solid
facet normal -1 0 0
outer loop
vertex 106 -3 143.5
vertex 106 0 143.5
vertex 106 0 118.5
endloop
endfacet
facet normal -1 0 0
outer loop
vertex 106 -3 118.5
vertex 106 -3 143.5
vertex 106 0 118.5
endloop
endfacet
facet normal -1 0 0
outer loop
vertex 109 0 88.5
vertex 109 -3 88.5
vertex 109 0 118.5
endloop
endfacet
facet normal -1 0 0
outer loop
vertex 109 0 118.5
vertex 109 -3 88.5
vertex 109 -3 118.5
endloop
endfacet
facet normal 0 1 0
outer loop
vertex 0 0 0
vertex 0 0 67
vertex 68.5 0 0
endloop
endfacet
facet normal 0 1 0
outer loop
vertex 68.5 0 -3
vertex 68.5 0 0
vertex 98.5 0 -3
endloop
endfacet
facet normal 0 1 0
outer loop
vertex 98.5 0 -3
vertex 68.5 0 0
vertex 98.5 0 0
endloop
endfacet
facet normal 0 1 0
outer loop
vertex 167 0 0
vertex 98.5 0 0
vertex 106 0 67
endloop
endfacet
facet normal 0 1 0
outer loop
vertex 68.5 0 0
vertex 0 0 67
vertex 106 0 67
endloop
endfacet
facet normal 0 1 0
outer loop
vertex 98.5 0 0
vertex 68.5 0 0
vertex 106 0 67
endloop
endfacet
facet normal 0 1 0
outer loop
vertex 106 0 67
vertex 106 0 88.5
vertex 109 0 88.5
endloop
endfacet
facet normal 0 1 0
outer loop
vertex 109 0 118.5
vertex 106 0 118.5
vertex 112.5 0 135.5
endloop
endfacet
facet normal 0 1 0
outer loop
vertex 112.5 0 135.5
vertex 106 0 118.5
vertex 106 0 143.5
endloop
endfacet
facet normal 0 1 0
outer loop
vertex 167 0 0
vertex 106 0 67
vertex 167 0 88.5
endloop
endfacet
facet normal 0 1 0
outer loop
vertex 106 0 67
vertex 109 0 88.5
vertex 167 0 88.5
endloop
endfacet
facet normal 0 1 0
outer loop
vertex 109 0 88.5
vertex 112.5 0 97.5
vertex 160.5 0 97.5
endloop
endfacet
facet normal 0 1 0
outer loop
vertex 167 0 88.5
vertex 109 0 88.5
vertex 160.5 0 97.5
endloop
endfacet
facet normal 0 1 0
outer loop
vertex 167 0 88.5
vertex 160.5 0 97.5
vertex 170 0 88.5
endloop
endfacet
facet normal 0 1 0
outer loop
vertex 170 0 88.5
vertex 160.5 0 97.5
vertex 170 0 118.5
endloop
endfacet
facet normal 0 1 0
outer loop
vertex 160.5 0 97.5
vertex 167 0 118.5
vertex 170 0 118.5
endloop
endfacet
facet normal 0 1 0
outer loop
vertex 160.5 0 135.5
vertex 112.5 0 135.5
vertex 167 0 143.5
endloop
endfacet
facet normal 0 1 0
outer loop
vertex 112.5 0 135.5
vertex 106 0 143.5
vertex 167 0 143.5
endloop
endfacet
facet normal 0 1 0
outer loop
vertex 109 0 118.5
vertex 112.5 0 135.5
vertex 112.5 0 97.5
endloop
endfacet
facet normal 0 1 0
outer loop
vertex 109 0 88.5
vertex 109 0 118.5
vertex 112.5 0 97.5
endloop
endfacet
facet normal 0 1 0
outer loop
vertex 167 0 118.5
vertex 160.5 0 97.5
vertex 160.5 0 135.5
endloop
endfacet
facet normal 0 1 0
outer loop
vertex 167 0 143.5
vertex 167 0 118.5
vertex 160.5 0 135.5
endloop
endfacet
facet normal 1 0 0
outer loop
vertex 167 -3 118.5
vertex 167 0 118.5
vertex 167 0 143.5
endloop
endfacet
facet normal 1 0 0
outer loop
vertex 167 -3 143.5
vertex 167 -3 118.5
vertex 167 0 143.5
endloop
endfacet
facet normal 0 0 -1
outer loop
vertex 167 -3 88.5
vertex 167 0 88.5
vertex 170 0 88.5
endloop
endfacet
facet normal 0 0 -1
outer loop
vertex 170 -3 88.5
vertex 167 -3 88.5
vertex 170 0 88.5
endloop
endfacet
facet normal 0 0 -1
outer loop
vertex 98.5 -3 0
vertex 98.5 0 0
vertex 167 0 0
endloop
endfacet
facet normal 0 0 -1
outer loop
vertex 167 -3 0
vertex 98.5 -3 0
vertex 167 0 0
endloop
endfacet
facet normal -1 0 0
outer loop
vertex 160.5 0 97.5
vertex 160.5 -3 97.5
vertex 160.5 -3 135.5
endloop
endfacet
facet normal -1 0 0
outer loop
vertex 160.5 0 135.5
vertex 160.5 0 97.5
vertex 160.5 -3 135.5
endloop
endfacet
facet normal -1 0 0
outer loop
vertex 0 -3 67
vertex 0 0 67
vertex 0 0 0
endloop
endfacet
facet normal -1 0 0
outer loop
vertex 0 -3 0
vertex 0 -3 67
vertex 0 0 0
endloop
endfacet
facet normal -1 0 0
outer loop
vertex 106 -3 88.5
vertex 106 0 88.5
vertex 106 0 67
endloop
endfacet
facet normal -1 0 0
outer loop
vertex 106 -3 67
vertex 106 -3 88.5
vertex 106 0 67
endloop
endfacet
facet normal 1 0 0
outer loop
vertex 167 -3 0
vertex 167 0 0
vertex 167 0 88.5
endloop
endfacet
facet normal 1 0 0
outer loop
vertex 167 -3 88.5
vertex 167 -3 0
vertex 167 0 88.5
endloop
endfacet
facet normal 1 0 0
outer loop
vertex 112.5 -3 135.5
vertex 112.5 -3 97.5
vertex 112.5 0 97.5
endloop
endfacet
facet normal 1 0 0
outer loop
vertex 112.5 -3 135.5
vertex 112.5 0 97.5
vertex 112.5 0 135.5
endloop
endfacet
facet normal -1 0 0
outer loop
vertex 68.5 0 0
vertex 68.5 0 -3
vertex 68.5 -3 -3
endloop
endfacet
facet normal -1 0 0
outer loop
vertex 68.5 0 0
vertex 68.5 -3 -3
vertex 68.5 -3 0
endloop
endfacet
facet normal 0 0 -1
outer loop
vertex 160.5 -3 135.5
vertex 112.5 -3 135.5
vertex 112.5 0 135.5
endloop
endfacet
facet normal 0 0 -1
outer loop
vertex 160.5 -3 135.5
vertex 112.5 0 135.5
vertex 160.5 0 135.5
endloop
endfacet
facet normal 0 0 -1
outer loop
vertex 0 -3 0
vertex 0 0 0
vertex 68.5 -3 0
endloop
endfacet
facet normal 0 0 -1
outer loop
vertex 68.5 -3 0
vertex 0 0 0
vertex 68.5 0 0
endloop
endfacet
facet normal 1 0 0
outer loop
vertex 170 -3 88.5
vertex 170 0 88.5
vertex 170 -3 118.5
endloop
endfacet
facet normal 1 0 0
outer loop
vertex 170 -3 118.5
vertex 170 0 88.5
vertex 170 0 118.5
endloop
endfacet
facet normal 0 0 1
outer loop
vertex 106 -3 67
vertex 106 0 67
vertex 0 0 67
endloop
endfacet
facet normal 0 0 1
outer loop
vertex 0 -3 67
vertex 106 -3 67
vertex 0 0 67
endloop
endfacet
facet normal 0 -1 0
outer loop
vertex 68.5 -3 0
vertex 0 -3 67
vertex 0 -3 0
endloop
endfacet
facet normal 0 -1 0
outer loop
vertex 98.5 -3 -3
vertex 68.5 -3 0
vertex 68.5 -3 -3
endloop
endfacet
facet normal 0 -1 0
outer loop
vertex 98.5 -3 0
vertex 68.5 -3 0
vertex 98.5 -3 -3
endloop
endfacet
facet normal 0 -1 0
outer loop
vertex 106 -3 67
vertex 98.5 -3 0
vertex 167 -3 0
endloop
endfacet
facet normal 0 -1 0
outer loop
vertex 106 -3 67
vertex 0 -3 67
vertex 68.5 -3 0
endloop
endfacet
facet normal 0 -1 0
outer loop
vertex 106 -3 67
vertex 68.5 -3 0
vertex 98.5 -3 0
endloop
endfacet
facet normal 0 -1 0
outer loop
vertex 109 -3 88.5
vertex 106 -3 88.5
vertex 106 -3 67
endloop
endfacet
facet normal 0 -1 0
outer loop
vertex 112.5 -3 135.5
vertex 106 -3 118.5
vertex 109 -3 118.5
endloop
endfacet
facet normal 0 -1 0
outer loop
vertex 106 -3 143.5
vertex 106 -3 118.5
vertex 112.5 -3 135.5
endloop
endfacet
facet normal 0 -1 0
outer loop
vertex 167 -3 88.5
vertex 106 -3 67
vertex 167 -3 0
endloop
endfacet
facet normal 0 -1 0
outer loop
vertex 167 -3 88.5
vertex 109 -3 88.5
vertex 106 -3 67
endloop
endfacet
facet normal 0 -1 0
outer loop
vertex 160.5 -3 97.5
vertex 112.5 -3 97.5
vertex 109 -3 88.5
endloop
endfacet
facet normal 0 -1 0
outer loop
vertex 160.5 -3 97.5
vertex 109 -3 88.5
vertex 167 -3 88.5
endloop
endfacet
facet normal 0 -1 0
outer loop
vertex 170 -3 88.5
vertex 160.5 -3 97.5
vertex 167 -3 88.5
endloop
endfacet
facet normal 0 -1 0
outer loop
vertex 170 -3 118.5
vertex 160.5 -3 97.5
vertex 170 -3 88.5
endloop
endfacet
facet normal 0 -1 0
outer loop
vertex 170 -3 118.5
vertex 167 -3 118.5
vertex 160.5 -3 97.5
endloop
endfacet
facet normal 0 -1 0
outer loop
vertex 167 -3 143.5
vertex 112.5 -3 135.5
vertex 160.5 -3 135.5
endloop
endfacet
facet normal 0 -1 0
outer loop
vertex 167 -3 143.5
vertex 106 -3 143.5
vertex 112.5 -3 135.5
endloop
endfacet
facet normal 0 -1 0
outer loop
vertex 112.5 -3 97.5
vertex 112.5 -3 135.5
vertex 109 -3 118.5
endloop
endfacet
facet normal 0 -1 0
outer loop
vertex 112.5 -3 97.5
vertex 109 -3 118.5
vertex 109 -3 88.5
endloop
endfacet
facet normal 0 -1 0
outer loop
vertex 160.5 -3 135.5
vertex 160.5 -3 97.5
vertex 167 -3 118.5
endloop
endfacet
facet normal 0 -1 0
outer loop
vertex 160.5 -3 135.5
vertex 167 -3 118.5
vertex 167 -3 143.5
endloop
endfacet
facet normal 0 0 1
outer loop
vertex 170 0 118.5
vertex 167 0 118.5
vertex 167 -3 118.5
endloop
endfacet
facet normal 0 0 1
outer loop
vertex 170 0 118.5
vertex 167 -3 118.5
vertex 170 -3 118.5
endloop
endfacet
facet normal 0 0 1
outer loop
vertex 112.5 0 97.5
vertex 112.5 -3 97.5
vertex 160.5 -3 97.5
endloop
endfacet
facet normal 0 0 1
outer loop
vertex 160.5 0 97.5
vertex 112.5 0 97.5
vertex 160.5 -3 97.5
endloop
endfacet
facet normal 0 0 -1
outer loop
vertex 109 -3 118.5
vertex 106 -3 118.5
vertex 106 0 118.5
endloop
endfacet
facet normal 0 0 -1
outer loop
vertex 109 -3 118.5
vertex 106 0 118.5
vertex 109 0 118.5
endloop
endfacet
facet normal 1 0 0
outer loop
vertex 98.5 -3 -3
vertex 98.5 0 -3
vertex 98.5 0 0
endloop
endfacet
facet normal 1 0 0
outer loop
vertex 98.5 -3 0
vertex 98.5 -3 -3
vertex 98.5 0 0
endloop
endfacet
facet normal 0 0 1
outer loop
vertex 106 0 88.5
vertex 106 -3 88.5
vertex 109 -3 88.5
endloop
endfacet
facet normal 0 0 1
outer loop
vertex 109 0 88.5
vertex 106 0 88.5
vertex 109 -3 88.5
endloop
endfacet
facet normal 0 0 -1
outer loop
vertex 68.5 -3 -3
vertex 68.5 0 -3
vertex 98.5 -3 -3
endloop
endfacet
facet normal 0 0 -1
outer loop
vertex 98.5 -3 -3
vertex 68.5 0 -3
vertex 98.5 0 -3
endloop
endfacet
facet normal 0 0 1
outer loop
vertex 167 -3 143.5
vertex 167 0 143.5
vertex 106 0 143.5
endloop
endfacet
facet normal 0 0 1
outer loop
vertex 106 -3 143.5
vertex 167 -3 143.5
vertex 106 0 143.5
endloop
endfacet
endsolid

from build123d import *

# Parameters (mm, degrees)
F0_W     = 30
F0_H     = 3
F0_W_2   = 3
F0_H_2   = 30
F1_DEPTH = 3
F2_W     = 48
F2_H     = 38
F2_W_2   = 3
F2_H_2   = 30
F3_DEPTH = 25


with BuildPart() as f1:
    # F0 (on Front) → F1 (new body)
    with BuildSketch(Plane.XZ):
        Polygon((0, 67), (0, 0), (68.5, 0), (98.5, 0), (167, 0), (167, 88.5), (167, 118.5), (167, 143.5), (106, 143.5), (106, 67), align=None)
        with Locations((83.5, -1.5)):
            Rectangle(F0_W, F0_H)
        with Locations((168.5, 103.5)):
            Rectangle(F0_W_2, F0_H_2)
    extrude(amount=F1_DEPTH)

    # F2 (on face) → F3 (cut)
    with BuildSketch(Plane.XZ.offset(3)):
        with Locations((136.5, 116.5)):
            Rectangle(F2_W, F2_H)
        with Locations((107.5, 103.5)):
            Rectangle(F2_W_2, F2_H_2)
    extrude(amount=-F3_DEPTH, mode=Mode.SUBTRACT)


solid = f1.part
